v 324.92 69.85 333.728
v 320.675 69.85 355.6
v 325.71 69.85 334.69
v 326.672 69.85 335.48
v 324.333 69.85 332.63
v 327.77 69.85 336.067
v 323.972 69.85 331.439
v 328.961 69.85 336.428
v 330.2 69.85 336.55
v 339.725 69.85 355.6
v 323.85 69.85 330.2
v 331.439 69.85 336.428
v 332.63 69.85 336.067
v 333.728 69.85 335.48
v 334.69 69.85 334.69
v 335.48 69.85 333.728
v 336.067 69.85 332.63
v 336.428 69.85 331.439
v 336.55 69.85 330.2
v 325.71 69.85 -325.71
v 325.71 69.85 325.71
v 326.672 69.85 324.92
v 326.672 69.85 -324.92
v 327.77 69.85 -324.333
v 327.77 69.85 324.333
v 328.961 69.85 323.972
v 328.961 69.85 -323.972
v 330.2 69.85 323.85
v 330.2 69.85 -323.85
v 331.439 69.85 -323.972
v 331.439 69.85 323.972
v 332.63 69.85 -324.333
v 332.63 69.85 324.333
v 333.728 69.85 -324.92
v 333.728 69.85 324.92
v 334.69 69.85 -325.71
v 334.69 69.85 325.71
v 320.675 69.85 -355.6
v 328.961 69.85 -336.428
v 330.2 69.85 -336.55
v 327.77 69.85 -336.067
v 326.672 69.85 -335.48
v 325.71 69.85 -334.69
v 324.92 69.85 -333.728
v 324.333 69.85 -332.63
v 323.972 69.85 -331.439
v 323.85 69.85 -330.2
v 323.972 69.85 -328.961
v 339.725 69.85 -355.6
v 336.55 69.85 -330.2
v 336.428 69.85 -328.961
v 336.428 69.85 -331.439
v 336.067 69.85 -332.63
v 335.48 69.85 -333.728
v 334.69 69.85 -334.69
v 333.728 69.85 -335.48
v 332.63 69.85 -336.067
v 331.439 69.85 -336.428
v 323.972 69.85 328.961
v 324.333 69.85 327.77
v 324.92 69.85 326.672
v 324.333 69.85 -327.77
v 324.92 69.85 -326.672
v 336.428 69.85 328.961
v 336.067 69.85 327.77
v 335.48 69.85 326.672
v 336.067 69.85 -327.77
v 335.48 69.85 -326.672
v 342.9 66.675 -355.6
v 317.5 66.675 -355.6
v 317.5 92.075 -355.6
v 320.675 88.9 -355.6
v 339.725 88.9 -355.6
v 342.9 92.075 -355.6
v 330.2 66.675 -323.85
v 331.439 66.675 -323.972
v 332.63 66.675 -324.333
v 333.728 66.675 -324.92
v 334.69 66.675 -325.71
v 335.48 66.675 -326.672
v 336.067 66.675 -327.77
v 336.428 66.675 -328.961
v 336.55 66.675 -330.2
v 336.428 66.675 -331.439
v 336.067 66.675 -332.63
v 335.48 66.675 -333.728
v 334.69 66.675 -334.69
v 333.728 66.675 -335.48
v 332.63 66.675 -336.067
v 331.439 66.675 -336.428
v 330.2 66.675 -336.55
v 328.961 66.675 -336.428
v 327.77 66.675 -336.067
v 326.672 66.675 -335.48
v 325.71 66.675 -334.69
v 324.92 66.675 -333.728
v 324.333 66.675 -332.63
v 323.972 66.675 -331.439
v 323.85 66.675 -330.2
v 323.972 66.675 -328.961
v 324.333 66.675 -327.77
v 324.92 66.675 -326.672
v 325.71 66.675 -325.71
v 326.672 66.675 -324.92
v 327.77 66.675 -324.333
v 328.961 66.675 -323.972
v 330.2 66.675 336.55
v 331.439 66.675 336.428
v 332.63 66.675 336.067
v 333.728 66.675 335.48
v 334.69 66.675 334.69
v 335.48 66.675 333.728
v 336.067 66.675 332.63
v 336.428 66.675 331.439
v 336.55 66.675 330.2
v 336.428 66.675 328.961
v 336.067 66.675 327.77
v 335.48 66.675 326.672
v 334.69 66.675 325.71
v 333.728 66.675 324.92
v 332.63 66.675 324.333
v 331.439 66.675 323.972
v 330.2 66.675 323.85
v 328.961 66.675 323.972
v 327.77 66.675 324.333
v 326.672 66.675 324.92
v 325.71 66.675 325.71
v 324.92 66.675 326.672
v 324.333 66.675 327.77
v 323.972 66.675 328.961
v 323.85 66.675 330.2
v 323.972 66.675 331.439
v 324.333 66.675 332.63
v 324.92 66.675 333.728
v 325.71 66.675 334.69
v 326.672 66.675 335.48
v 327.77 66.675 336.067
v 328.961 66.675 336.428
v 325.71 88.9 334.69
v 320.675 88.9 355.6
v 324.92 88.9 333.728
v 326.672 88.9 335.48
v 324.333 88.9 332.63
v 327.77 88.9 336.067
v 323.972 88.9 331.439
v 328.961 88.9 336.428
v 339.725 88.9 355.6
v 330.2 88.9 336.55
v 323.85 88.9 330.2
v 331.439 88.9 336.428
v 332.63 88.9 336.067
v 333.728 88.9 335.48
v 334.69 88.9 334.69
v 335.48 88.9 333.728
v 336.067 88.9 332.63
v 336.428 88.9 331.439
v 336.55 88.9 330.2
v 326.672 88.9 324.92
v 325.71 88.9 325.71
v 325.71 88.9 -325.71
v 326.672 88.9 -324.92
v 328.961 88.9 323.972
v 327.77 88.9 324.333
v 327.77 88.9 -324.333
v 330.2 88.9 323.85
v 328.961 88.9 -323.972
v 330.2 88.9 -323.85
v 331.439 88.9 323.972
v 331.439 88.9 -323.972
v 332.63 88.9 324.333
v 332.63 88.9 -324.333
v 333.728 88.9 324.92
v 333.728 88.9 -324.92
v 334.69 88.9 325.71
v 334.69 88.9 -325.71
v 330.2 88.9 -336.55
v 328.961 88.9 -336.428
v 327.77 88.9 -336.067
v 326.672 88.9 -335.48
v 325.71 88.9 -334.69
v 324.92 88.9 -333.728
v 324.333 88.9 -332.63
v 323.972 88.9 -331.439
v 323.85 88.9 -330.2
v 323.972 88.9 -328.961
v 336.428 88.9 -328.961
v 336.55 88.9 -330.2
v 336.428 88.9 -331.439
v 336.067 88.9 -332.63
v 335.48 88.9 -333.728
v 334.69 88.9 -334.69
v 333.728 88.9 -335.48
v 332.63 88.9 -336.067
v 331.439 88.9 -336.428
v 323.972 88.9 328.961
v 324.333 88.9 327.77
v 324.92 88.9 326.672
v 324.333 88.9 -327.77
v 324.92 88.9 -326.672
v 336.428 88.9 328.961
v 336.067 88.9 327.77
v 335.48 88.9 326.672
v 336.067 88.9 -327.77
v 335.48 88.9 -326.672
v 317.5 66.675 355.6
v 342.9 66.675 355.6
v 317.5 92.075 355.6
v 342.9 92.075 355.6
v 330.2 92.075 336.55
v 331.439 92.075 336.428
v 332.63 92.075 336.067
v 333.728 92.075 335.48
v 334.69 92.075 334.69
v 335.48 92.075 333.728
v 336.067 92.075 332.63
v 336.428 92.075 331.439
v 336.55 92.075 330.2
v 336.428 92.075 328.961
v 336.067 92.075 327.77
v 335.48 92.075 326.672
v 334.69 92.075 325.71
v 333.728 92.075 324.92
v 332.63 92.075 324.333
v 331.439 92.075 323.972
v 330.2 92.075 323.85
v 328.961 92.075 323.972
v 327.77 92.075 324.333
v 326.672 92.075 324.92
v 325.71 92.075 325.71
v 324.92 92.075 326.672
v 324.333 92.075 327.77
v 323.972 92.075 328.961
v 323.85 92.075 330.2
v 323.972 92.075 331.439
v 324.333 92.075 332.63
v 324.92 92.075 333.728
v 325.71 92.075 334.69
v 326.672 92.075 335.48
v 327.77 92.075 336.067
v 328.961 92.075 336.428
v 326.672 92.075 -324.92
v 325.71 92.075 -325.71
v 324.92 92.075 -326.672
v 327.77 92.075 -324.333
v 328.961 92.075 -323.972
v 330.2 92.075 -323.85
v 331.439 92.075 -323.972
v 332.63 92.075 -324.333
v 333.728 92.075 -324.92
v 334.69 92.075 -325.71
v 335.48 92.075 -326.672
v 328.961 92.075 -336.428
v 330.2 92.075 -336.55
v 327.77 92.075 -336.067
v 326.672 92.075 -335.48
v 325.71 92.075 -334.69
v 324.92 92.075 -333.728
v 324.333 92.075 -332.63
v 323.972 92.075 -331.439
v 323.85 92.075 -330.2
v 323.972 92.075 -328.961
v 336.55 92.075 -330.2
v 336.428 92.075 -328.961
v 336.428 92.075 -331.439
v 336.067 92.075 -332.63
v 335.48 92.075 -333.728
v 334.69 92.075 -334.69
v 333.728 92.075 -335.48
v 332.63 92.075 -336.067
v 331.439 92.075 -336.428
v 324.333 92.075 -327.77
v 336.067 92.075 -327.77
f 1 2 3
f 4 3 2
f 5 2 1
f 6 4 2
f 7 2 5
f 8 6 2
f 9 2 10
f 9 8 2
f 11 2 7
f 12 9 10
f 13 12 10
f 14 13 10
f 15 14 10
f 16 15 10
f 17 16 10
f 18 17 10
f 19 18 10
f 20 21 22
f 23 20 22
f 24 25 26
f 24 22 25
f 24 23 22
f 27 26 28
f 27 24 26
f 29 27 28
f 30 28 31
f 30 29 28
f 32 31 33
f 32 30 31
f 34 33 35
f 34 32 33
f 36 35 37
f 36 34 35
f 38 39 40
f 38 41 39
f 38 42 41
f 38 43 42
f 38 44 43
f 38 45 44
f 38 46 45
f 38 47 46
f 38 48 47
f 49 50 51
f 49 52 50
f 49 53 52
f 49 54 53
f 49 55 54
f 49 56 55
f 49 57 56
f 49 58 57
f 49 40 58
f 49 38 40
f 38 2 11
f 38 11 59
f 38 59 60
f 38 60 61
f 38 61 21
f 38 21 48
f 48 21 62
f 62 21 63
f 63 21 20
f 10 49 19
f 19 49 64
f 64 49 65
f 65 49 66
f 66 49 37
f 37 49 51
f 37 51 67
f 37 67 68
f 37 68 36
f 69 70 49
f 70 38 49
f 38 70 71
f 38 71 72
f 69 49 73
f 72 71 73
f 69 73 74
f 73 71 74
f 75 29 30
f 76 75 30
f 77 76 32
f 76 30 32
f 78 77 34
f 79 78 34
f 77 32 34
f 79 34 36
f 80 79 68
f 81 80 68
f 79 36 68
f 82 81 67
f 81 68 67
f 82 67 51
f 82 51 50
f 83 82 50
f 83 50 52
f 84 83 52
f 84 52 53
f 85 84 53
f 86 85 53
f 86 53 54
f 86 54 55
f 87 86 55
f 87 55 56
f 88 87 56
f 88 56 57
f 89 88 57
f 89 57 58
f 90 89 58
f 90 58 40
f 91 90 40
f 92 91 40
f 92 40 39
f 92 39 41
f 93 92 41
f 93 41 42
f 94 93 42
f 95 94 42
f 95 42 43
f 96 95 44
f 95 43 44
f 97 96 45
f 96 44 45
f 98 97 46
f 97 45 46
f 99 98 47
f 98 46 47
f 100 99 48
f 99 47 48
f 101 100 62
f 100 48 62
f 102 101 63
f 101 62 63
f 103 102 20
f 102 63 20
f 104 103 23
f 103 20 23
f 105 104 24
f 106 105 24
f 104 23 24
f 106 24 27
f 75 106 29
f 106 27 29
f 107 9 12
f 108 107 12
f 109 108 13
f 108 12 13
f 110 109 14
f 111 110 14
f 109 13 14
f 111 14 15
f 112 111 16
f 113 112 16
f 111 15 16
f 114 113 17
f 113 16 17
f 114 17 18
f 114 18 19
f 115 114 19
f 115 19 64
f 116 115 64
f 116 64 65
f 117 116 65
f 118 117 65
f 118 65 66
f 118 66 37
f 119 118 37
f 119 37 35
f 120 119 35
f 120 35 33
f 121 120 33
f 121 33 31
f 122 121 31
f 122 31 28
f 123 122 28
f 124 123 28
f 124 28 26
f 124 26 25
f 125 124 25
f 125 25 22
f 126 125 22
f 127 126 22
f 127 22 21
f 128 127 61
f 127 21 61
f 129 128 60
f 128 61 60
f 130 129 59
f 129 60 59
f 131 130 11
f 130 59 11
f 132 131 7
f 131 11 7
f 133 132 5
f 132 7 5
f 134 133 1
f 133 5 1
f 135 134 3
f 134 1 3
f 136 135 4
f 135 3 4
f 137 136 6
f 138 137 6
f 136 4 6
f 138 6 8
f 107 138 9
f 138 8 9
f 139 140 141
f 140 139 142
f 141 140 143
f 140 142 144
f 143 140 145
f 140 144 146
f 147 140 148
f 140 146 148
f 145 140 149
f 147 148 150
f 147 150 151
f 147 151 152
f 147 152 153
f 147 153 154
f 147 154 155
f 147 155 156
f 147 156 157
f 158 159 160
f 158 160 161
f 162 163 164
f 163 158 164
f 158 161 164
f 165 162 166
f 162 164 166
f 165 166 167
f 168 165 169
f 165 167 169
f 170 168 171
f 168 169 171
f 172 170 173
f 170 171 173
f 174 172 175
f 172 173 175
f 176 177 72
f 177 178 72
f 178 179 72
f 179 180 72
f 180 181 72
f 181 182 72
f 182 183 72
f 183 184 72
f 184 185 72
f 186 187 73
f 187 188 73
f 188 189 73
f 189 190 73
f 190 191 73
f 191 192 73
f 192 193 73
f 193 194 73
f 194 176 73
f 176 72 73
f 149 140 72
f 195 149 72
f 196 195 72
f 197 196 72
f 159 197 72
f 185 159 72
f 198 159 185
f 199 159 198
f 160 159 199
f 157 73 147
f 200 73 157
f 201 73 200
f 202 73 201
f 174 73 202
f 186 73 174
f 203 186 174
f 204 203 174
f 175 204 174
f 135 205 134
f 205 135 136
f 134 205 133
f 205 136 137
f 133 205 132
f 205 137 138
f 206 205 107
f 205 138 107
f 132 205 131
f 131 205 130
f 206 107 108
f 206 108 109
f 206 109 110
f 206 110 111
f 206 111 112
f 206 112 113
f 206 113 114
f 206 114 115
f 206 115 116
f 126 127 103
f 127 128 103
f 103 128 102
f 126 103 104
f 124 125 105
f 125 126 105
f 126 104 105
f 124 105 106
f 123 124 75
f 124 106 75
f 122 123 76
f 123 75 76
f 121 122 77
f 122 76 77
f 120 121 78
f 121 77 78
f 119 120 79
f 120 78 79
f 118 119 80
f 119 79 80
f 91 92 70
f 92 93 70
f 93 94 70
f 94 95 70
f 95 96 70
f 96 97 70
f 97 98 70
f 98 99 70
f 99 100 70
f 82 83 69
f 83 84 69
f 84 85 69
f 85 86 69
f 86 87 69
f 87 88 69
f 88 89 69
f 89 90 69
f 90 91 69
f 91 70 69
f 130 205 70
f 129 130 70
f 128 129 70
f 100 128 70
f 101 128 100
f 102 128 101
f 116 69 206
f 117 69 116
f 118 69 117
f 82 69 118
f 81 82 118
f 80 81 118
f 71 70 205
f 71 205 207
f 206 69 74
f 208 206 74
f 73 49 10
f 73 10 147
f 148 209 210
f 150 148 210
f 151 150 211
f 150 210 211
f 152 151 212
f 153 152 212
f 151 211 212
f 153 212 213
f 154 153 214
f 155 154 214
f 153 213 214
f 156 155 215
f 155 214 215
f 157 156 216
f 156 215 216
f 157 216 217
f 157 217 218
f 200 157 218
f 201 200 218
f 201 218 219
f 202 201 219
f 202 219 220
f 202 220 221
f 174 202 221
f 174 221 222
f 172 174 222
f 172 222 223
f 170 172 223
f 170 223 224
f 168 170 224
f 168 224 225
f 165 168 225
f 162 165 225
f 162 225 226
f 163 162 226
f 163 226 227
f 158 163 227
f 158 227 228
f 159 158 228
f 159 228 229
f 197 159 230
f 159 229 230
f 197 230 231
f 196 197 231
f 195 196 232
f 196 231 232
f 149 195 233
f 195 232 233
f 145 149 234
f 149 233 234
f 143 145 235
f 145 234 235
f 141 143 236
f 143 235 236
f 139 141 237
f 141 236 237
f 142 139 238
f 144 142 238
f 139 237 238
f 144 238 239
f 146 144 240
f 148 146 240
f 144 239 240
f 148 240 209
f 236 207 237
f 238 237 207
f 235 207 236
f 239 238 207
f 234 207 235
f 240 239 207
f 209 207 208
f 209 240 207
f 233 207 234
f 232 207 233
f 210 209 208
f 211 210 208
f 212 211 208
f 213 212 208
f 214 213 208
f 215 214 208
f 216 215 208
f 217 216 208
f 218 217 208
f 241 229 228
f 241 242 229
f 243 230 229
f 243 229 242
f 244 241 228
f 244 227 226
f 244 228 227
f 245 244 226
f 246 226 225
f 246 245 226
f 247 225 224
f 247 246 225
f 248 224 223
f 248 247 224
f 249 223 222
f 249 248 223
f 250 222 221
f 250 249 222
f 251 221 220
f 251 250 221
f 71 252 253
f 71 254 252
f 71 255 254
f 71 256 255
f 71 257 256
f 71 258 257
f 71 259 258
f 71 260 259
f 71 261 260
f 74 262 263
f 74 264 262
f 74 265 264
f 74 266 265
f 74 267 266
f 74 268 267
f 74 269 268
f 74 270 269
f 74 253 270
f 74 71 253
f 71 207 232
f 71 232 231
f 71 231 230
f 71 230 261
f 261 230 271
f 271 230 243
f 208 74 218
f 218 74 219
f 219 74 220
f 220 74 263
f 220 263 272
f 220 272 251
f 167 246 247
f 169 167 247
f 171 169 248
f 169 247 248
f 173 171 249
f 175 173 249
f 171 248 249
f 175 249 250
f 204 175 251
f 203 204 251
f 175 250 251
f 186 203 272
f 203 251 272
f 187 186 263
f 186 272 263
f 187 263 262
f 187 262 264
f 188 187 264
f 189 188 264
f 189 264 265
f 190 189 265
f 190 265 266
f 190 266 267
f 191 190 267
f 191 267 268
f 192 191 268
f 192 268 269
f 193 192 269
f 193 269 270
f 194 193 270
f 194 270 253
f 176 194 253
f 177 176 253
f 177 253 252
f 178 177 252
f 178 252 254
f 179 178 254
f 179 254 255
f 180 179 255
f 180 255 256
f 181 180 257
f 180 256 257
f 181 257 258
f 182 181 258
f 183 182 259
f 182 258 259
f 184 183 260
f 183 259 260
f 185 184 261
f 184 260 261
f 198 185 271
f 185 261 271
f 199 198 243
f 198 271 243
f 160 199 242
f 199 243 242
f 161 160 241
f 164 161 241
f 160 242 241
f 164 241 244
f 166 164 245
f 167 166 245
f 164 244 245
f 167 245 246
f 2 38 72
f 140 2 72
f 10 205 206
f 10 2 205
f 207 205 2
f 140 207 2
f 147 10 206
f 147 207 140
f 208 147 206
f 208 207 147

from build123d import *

# Parameters (mm, degrees)
BOSS_EXTRUDE1_DEPTH      = 355.6
BOSS_EXTRUDE1_DEPTH_BACK = 355.6
SKETCH1_W                = 25.4
SKETCH1_H                = 25.4
SKETCH1_W_2              = 19.05
SKETCH1_H_2              = 19.05
SKETCH2_R                = 6.35
CUT_EXTRUDE1_DEPTH       = 495.648289191


with BuildPart() as part:
    # Sketch1 → Boss-Extrude1 (new, two sides: drawn at the far end of the back side and taken through both)
    with BuildSketch(Plane.XY.offset(-BOSS_EXTRUDE1_DEPTH_BACK)):
        with Locations((330.2, 79.375)):
            Rectangle(SKETCH1_W, SKETCH1_H)
        with Locations((330.2, 79.375)):
            Rectangle(SKETCH1_W_2, SKETCH1_H_2, mode=Mode.SUBTRACT)
    extrude(amount=BOSS_EXTRUDE1_DEPTH + BOSS_EXTRUDE1_DEPTH_BACK)

    # Sketch2 → Cut-Extrude1 (cut, through all)
    with BuildSketch(Plane(origin=(0, 92.075, 0), x_dir=(1, 0, 0), z_dir=(0, 1, 0))):
        with Locations(Location((330.2, -330.2, 0), (0, 0, 270))):
            Circle(SKETCH2_R)
        with Locations(Location((330.2, 330.2, 0), (0, 0, 270))):
            Circle(SKETCH2_R)
    extrude(amount=-CUT_EXTRUDE1_DEPTH, mode=Mode.SUBTRACT)


solid = part.part
